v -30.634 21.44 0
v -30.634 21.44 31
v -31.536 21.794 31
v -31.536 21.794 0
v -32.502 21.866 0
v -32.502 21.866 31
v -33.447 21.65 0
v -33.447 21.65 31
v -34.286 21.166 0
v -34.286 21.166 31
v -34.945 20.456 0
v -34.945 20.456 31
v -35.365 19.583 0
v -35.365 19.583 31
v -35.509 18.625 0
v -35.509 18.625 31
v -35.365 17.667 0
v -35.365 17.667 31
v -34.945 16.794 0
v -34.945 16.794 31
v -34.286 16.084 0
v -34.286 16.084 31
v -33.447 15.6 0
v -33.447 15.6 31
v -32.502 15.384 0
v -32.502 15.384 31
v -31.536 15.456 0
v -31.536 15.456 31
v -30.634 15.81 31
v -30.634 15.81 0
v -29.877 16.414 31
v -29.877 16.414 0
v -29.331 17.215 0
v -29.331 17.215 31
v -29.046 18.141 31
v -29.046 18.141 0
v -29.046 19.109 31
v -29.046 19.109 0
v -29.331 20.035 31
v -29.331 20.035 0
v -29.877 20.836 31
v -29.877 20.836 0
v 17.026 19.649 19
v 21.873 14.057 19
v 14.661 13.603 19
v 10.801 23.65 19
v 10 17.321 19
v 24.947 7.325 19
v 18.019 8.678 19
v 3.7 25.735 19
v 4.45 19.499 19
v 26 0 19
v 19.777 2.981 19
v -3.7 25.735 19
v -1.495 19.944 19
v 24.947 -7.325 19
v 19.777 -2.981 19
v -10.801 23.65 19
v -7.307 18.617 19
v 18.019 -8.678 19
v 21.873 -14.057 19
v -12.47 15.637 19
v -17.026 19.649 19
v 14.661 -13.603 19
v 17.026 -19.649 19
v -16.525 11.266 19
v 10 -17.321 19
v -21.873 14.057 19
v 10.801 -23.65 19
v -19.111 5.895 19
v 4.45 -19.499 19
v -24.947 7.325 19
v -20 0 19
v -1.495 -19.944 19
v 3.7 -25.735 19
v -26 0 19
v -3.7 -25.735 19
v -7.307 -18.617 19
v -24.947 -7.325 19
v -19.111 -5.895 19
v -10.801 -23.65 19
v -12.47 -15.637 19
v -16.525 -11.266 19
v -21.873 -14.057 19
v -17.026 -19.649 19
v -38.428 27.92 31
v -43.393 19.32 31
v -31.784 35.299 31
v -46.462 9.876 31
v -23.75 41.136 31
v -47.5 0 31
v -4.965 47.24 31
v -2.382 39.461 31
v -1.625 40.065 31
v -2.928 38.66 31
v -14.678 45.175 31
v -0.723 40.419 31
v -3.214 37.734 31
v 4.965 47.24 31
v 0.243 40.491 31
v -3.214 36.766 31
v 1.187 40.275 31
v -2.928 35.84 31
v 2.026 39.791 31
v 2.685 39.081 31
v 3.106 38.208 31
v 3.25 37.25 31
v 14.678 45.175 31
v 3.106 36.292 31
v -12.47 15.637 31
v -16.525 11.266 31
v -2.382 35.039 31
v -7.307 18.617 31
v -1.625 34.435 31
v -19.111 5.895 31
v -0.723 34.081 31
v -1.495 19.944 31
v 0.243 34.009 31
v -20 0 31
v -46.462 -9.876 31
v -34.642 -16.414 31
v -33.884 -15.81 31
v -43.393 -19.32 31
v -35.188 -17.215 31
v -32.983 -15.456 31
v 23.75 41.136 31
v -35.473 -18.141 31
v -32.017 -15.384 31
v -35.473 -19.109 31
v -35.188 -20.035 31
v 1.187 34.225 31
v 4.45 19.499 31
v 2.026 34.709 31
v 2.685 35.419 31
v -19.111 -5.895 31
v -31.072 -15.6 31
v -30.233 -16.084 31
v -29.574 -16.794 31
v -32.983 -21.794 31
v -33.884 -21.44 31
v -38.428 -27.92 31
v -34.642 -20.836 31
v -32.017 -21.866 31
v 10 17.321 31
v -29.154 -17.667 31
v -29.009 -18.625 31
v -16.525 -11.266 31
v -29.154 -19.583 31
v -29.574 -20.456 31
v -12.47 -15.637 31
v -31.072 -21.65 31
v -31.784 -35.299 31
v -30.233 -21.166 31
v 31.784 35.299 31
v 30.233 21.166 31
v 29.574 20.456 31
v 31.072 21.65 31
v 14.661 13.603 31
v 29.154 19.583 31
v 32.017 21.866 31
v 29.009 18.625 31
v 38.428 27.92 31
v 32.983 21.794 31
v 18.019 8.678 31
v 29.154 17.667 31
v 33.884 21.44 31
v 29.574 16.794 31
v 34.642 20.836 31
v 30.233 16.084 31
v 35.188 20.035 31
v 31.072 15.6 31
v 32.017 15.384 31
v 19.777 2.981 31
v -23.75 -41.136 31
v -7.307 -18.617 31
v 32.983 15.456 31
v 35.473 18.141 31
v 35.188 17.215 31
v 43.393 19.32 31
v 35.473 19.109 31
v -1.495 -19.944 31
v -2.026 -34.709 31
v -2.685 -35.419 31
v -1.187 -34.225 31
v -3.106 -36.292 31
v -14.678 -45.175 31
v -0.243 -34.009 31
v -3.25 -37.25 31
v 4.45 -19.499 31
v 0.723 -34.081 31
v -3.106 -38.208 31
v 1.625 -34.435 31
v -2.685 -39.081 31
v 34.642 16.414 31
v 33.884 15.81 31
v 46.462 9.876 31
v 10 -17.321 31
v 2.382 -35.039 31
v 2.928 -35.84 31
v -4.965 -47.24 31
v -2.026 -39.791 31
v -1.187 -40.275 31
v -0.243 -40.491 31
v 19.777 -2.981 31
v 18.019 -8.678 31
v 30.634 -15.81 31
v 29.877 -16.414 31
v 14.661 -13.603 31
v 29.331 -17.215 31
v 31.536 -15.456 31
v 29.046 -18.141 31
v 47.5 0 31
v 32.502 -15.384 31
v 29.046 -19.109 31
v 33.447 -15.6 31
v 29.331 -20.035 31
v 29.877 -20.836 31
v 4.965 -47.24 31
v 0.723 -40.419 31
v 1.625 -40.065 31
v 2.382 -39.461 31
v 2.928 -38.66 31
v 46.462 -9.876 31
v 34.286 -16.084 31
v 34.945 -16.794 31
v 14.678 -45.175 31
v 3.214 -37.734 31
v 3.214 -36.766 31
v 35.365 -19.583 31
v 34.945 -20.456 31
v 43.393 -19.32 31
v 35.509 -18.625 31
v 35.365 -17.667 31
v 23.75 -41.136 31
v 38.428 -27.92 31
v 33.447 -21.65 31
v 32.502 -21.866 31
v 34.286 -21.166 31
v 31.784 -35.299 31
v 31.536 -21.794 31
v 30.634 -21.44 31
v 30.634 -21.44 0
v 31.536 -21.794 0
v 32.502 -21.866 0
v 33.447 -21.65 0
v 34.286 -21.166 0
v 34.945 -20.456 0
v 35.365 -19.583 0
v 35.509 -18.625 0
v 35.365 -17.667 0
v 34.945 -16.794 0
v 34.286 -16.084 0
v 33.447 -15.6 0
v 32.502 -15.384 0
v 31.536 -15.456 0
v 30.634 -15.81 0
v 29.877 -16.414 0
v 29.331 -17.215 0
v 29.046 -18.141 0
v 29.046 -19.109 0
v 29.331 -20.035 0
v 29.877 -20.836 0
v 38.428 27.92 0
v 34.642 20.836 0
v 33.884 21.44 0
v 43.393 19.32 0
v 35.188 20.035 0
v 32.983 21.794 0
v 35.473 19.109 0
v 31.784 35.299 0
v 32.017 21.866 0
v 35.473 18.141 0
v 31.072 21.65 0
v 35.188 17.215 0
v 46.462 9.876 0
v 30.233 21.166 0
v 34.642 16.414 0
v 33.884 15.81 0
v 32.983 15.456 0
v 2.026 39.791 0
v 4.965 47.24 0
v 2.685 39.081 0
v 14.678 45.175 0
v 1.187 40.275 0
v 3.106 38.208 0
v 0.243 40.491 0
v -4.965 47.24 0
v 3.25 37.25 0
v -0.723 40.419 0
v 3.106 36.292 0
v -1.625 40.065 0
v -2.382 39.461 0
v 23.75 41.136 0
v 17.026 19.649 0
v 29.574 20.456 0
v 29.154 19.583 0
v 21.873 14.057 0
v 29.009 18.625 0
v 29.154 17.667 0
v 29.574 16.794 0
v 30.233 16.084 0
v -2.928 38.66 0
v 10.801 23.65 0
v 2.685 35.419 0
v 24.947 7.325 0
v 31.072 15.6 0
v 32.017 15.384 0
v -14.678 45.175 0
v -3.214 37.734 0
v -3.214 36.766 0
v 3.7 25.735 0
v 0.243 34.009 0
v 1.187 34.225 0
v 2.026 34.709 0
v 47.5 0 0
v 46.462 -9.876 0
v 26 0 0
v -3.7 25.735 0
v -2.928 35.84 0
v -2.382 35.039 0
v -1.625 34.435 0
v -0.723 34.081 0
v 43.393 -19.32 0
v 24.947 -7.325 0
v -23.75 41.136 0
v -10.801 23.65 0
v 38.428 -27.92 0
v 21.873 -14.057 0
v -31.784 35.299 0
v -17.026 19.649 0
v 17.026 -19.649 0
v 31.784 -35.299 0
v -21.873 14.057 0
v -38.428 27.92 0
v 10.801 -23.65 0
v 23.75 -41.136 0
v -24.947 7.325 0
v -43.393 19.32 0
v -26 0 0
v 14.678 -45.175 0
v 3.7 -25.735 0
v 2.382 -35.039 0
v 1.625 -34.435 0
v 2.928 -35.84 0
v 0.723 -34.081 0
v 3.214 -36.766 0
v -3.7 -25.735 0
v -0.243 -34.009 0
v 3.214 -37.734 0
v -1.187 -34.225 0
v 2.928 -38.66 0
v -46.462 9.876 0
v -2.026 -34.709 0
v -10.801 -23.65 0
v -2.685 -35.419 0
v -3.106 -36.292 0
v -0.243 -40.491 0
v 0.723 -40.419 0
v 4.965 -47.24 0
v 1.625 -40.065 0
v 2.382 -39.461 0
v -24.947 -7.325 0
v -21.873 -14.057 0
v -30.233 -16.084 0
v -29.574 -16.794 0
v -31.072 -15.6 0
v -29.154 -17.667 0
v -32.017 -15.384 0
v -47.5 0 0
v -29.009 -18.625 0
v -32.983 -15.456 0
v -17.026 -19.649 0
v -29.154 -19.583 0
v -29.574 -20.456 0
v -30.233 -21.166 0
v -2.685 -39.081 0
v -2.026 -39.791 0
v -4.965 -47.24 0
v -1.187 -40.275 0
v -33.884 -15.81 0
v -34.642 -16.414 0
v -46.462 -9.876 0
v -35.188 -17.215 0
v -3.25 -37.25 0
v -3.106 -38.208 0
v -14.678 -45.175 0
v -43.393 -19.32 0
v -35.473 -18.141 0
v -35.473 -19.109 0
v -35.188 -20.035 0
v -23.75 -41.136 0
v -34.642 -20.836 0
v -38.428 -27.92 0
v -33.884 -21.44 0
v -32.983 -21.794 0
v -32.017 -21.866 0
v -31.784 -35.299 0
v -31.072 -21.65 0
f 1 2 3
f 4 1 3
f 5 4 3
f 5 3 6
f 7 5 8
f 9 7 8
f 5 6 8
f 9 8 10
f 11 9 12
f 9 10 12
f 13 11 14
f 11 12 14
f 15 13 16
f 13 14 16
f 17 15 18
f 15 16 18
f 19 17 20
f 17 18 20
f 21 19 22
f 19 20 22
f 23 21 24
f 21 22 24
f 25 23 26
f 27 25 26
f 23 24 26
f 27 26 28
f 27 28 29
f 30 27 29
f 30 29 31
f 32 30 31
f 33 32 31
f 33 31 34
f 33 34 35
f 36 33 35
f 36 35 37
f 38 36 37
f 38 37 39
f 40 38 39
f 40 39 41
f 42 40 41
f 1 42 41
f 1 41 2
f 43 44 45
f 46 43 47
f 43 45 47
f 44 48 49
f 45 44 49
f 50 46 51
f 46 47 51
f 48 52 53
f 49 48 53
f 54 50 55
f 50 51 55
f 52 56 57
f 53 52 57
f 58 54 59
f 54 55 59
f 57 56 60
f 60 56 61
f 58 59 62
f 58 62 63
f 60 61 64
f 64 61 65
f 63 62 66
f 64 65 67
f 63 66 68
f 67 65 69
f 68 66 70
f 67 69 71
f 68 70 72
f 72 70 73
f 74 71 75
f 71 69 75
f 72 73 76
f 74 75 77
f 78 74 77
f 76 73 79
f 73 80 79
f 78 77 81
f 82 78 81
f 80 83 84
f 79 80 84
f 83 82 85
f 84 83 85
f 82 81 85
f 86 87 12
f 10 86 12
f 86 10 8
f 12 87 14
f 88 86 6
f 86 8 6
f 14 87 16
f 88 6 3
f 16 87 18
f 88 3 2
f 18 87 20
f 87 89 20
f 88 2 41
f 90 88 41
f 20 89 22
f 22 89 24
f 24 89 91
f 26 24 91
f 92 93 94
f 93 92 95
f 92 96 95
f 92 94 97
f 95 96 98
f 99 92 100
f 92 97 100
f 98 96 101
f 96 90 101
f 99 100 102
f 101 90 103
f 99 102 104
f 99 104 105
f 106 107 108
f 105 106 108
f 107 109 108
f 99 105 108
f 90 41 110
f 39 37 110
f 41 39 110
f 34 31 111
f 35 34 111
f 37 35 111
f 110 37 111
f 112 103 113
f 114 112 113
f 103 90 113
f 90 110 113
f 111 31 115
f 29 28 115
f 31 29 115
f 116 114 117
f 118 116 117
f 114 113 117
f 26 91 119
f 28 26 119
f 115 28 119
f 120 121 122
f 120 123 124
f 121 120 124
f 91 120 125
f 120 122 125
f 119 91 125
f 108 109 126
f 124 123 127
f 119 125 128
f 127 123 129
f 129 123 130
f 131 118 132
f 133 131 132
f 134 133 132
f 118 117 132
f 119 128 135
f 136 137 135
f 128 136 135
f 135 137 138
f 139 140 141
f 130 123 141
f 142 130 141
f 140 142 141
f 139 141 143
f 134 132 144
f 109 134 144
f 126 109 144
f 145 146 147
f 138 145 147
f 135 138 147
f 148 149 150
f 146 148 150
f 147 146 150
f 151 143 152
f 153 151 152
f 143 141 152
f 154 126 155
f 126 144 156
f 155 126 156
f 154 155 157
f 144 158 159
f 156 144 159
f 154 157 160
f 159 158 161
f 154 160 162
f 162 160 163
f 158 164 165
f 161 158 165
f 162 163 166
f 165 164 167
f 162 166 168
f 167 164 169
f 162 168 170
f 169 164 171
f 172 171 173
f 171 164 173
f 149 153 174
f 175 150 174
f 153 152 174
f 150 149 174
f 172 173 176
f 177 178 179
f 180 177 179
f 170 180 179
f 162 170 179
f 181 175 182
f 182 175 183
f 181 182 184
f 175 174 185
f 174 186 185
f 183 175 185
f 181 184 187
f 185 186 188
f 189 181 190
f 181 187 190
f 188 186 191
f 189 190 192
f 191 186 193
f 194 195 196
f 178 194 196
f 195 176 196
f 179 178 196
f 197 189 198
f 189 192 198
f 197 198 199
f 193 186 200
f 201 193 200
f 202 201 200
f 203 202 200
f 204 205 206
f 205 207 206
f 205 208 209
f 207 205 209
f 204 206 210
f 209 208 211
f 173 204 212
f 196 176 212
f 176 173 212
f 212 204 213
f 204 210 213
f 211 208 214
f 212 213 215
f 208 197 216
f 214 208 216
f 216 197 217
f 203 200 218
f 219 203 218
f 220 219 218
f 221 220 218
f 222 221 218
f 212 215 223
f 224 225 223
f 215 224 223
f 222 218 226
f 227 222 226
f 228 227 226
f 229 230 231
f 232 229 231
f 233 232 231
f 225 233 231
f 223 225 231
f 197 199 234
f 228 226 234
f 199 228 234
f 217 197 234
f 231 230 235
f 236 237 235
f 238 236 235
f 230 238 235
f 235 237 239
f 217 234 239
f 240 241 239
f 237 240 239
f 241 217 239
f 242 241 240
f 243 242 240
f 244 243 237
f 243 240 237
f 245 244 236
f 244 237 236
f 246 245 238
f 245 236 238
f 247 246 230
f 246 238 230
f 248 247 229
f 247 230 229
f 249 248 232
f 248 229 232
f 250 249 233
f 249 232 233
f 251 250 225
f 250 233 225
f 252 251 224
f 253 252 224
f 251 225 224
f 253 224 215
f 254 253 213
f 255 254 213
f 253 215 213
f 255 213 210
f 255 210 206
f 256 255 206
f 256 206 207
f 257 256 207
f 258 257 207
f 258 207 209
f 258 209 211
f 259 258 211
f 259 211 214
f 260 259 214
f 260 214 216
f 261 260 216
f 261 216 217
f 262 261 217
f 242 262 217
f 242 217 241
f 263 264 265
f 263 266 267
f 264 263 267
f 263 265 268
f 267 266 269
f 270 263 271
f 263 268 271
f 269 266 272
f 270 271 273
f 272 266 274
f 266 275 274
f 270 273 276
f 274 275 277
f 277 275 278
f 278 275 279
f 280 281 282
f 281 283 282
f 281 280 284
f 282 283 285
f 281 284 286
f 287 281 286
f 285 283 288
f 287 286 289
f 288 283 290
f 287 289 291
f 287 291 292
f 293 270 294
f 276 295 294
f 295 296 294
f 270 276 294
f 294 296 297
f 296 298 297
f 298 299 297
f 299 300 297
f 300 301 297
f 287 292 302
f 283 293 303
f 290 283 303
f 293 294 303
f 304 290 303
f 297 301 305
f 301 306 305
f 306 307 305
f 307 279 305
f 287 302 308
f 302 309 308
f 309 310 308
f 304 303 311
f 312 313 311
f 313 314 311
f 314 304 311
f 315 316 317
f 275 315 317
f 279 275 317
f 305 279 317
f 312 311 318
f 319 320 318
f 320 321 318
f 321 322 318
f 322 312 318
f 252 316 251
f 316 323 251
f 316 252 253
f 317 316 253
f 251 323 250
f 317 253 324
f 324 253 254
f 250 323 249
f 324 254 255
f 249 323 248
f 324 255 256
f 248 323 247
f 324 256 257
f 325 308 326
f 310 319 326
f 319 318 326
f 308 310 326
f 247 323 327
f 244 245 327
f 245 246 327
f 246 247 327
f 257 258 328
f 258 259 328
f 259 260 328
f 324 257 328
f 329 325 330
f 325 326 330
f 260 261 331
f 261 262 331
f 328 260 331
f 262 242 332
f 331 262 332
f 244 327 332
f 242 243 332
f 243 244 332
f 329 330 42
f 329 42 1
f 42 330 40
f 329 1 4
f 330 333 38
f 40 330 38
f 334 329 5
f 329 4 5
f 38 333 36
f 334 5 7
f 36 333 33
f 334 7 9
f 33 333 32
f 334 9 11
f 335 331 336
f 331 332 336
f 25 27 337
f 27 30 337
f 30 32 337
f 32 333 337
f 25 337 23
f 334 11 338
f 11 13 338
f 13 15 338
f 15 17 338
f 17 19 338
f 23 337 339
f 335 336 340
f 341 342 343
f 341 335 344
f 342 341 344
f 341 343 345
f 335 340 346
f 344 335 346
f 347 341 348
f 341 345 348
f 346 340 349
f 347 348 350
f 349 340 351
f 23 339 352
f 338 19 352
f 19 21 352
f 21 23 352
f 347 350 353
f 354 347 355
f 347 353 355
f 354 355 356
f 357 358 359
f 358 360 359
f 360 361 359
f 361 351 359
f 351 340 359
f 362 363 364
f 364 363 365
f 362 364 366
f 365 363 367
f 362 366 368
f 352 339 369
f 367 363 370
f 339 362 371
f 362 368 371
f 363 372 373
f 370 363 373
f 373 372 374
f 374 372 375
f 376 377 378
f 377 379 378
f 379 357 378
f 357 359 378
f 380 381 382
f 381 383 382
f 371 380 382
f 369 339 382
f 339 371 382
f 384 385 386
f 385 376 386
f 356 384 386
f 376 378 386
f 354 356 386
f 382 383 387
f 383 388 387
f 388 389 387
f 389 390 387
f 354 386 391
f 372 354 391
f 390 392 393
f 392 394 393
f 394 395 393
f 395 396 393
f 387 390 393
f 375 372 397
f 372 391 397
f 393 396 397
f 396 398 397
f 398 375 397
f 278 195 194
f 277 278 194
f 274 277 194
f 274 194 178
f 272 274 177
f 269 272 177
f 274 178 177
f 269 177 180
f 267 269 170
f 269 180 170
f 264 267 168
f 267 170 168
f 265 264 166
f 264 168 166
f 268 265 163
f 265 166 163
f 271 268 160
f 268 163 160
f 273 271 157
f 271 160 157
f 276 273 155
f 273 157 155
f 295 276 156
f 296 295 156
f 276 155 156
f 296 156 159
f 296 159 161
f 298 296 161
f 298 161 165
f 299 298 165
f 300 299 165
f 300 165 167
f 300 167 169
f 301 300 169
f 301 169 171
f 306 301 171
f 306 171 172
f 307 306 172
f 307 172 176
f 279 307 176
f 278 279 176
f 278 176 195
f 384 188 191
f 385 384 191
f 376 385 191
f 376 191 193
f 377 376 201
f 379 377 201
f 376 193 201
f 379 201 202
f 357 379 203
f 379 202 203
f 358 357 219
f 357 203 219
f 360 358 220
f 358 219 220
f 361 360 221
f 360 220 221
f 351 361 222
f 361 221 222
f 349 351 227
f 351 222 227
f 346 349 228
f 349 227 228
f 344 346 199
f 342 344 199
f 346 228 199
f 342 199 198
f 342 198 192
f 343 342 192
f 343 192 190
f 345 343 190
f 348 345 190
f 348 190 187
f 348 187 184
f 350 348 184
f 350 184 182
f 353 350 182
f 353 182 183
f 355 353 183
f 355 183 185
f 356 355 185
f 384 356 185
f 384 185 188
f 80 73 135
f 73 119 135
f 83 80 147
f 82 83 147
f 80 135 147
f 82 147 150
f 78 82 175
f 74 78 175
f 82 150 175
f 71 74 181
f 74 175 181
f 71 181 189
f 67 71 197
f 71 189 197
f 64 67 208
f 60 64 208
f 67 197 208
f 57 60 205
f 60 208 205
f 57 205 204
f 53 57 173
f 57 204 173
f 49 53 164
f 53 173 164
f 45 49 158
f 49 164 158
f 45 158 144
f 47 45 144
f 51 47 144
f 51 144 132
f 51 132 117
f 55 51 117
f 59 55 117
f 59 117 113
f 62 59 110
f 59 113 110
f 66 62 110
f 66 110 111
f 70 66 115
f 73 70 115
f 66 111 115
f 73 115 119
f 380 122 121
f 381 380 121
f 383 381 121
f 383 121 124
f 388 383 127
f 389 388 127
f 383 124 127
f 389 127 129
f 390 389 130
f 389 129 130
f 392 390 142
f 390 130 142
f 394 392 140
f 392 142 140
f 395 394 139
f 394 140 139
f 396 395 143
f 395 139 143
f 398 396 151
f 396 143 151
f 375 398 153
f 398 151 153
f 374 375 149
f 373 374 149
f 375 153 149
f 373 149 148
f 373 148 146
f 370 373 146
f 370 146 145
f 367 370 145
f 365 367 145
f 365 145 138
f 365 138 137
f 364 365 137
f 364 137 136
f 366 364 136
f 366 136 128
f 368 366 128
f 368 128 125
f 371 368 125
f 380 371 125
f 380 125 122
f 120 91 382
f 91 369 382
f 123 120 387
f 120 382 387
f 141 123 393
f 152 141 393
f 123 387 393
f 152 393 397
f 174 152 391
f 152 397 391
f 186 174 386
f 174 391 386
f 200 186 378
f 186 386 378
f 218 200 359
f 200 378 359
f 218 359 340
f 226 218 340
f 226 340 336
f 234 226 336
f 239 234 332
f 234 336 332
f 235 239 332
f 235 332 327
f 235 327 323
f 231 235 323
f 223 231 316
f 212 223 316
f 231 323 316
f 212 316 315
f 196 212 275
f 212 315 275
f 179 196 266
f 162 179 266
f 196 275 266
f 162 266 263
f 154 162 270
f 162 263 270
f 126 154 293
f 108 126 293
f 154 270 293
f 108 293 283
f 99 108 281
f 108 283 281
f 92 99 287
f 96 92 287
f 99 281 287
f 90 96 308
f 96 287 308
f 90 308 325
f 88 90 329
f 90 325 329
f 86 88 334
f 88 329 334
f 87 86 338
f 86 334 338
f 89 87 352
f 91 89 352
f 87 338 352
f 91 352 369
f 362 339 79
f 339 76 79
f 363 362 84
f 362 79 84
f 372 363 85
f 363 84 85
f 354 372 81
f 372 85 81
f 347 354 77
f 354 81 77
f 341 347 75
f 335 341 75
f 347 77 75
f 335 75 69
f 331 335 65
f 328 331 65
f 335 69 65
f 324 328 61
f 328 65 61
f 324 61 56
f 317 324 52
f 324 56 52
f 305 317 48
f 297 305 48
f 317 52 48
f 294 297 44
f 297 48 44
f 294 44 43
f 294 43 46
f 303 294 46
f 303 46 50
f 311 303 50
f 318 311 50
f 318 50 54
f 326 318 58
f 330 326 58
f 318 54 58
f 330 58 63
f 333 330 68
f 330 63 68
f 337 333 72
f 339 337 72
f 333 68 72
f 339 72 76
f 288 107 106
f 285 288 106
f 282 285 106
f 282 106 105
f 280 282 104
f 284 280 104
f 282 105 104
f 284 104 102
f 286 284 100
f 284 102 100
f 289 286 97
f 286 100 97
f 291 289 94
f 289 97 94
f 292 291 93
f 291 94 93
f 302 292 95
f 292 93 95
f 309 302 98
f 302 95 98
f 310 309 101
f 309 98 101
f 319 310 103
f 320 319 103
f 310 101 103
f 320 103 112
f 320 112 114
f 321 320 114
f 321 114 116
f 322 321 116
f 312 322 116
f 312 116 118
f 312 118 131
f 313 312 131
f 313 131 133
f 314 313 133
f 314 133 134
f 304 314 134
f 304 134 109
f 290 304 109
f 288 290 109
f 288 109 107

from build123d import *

# Parameters (mm, degrees)
SKETCH2_R          = 3.25
CUT_EXTRUDE1_DEPTH = 74.98310618
CIRPATTERN1_COUNT  = 6


with BuildPart() as part:
    # Sketch1 → Revolve1 (revolve)
    with BuildSketch(Plane(origin=(0, 0, 0), x_dir=(0, 0, -1), z_dir=(1, 0, 0)), mode=Mode.PRIVATE) as revolve1_sk:
        Polygon((-31, 47.5), (0, 47.5), (0, 26), (-19, 26), (-19, 20), (-31, 20), align=None)
    revolve(revolve1_sk.sketch.rotate(Axis((0, 0, 0), (0, 0, 1)), 90), axis=Axis((0, 0, 0), (0, 0, 1)))

    # Sketch2 → Cut-Extrude1 (cut, through all)
    with BuildSketch(Plane.XY.offset(31)):
        with Locations((0, 37.25)):
            Circle(SKETCH2_R)
    cut_extrude1 = extrude(amount=-CUT_EXTRUDE1_DEPTH, mode=Mode.SUBTRACT)

    # CirPattern1: Cut-Extrude1 ×6 about axis
    cirpattern1_axis = Axis((0, 0, 0), (0, 0, 1))
    for i in range(1, CIRPATTERN1_COUNT):
        add(cut_extrude1.rotate(cirpattern1_axis, i * 360 / CIRPATTERN1_COUNT), mode=Mode.SUBTRACT)


solid = part.part
